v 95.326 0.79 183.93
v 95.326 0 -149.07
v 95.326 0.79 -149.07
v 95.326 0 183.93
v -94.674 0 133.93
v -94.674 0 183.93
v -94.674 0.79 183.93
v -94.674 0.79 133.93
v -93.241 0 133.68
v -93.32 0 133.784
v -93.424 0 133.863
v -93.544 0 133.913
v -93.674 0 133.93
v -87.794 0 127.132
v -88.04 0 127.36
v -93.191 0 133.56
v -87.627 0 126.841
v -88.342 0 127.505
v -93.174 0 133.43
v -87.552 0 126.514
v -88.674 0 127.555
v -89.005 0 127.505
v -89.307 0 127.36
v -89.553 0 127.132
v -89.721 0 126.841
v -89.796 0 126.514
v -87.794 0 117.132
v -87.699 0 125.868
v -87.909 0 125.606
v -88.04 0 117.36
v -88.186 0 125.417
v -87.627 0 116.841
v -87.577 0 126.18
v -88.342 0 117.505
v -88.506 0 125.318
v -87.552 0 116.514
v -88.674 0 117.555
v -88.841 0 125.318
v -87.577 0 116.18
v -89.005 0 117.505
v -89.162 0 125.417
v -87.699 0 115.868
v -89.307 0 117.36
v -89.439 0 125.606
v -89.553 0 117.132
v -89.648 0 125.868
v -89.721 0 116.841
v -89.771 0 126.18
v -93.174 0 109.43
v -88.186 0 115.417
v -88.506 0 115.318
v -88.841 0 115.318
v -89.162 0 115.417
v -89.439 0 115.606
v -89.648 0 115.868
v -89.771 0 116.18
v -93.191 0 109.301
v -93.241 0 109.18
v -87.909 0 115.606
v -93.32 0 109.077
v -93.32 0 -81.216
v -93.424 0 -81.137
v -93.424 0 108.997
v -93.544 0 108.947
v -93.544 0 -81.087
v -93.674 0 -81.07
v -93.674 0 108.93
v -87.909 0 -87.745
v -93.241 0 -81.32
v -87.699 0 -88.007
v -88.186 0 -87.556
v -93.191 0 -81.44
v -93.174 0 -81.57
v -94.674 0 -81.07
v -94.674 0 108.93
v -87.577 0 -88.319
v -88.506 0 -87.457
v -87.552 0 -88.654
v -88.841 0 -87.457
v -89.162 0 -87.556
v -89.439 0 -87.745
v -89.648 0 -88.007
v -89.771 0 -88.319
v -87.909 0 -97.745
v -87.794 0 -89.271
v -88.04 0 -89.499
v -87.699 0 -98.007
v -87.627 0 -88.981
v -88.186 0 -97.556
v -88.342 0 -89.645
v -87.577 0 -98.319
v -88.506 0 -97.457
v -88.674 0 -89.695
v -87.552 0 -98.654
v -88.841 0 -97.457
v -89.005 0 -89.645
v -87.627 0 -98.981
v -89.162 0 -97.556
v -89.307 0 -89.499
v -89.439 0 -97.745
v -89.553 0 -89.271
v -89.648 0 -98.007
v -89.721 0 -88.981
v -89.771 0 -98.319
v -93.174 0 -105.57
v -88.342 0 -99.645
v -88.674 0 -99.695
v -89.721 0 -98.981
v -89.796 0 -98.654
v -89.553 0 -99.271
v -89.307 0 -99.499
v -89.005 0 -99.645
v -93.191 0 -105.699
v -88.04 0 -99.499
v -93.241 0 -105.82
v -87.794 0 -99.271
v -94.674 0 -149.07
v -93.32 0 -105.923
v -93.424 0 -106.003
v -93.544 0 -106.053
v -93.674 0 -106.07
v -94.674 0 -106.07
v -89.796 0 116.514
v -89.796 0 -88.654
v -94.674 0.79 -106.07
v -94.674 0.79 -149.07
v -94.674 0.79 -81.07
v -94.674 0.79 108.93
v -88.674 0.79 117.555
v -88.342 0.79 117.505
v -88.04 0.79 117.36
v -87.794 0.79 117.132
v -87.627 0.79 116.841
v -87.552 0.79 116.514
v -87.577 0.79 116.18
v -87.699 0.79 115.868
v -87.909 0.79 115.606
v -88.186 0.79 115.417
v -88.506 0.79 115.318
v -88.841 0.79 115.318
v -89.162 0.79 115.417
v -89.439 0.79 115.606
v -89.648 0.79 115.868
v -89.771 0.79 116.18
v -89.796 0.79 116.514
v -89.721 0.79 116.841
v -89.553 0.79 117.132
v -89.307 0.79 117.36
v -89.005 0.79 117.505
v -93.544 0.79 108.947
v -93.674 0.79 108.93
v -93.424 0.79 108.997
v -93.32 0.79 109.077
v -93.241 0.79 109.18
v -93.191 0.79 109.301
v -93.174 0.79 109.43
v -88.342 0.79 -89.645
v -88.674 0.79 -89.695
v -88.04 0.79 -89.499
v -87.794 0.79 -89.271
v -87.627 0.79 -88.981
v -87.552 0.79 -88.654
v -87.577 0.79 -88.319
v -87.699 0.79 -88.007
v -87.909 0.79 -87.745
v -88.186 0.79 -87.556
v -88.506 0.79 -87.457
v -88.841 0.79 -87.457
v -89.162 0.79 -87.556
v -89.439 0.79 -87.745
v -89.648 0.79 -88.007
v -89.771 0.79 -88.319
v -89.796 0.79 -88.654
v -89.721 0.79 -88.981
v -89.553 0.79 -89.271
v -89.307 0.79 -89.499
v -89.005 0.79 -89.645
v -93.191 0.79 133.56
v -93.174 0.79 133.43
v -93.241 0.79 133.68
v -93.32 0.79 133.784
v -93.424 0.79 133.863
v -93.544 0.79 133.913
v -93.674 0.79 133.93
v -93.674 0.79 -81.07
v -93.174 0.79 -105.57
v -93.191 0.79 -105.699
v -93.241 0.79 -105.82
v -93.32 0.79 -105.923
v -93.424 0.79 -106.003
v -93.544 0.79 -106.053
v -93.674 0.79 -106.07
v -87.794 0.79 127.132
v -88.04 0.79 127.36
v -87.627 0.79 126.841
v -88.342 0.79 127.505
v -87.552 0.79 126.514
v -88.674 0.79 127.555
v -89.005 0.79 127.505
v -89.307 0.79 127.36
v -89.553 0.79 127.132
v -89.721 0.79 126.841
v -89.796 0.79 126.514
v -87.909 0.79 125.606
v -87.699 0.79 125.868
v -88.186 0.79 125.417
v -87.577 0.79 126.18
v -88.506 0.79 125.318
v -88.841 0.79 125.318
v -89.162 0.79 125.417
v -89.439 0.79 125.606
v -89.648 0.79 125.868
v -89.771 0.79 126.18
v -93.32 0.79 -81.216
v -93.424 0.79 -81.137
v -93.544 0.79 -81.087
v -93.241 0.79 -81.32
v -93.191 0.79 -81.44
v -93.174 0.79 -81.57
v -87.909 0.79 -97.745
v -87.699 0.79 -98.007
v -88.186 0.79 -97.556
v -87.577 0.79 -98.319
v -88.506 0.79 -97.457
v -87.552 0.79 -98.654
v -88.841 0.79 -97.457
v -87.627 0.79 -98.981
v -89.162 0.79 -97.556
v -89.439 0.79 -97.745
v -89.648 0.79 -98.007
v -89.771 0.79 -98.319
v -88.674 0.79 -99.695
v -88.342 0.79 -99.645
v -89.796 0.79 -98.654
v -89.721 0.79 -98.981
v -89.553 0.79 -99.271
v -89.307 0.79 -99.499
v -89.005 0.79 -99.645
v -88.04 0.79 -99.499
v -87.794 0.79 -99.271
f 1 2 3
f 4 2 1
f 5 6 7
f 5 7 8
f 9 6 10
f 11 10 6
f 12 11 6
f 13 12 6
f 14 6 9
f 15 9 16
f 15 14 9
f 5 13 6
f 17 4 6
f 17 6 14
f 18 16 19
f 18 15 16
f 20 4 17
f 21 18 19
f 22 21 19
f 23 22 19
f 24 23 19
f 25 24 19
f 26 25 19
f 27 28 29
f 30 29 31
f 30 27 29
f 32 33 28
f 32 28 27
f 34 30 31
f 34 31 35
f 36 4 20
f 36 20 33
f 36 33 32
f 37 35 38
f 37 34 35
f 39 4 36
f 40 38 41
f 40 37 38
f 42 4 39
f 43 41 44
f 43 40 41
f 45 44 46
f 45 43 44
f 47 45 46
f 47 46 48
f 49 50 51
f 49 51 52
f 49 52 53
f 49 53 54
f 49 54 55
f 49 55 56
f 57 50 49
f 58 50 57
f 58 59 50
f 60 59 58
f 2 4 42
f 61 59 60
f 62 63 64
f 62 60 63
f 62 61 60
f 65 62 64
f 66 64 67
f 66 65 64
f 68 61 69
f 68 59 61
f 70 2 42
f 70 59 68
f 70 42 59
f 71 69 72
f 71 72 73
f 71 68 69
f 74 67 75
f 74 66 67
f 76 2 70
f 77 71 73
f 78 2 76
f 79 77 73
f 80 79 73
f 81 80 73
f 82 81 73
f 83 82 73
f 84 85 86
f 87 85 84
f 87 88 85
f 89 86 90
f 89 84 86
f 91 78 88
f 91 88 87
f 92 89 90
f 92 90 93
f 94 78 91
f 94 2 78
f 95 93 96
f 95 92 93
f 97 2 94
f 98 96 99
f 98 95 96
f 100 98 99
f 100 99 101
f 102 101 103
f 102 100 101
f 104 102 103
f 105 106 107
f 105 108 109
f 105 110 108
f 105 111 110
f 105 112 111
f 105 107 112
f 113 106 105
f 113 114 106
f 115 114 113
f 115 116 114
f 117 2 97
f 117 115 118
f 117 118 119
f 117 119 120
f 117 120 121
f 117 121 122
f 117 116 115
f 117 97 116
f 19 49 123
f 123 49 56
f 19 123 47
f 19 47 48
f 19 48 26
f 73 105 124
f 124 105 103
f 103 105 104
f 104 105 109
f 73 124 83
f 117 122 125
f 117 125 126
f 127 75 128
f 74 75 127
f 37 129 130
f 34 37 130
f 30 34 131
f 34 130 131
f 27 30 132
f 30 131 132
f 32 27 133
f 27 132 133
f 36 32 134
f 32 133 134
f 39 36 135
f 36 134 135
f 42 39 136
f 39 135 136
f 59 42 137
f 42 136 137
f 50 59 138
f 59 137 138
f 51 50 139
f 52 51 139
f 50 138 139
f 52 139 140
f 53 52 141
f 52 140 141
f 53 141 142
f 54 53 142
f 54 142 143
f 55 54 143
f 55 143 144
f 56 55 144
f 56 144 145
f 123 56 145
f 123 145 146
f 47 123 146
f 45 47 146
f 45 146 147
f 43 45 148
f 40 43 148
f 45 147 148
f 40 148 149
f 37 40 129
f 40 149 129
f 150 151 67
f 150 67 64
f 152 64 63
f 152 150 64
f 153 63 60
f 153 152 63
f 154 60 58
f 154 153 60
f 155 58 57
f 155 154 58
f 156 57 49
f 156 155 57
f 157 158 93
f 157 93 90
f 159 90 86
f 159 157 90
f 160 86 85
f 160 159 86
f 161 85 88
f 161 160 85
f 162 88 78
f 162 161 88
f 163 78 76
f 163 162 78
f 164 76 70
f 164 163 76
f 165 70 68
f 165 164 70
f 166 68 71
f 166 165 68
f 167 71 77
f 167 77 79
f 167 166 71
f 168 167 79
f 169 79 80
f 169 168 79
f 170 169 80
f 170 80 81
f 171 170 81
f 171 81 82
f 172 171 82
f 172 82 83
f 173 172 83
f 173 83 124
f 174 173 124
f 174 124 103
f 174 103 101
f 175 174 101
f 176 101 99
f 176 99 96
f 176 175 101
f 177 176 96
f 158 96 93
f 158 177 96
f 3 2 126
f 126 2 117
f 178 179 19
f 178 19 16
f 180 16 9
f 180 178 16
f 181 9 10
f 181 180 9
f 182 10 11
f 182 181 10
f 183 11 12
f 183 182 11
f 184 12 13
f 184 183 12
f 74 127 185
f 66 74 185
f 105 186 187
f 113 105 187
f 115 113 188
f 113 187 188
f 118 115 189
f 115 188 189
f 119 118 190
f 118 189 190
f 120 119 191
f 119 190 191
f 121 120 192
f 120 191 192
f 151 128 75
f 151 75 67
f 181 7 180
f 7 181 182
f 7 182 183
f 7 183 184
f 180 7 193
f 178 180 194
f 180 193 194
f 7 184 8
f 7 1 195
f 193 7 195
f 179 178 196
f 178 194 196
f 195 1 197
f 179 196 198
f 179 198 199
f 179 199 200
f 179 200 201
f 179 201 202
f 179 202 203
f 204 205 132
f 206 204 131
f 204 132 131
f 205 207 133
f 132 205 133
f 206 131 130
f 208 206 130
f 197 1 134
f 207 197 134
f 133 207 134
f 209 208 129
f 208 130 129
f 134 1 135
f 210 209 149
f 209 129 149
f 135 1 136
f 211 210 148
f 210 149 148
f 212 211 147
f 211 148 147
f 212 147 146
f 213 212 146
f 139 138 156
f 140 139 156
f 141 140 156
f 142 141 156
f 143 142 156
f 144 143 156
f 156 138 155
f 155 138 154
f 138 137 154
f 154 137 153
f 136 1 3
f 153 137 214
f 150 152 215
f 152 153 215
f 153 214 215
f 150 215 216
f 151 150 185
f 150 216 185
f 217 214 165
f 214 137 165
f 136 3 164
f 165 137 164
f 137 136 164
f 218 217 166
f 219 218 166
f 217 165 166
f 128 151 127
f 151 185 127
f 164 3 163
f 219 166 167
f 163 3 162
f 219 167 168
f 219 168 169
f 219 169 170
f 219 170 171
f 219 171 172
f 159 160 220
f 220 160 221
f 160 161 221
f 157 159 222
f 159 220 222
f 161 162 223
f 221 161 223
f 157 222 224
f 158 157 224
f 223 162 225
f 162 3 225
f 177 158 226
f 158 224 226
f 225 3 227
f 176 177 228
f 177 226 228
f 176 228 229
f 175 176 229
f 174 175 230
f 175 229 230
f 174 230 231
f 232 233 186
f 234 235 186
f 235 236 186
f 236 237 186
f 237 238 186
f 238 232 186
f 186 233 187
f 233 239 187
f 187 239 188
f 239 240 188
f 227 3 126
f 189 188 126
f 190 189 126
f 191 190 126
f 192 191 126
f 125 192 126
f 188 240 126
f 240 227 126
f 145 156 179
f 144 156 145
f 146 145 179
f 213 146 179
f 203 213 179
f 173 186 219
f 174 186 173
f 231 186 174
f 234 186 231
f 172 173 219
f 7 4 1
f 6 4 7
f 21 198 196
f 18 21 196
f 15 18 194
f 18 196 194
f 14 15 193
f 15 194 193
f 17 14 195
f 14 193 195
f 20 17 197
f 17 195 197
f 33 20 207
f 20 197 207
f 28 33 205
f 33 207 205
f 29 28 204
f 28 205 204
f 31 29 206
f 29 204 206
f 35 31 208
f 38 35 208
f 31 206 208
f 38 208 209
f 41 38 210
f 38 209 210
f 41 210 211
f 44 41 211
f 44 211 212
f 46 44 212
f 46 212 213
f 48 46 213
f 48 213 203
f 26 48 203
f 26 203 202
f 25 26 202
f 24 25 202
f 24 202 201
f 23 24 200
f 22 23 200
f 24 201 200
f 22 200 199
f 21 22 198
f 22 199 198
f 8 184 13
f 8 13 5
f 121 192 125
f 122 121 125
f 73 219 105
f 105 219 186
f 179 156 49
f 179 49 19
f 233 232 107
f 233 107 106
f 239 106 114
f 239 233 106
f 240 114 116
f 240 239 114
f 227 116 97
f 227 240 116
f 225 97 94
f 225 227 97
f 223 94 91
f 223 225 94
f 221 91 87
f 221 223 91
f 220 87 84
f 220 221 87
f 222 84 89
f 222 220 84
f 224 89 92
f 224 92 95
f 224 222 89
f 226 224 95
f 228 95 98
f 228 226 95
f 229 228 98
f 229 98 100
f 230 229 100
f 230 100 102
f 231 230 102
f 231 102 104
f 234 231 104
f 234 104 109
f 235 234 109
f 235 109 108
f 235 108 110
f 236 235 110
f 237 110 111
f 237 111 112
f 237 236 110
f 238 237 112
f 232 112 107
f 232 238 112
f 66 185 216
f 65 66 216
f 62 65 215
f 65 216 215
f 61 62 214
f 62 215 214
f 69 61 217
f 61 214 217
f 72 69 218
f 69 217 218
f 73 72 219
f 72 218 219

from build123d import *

# Parameters (mm, degrees)
PANEL_DEPTH       = 0.79
SKETCH3_R         = 1.125
HINGE_MOUNT_DEPTH = 0.79


with BuildPart() as part:
    # Sketch1 → Panel (new body)
    with BuildSketch(Plane(origin=(0, 0, 0), x_dir=(1, 0, 0), z_dir=(0, 1, 0))):
        Polygon((65.326251897, 149.069802731), (95.326251897, 149.069802731), (95.326251897, -183.930197269), (-94.673748103, -183.930197269), (-94.673748103, 149.069802731), (-64.673748103, 149.069802731), (-39.673748103, 149.069802731), (40.326251897, 149.069802731), align=None)
    extrude(amount=PANEL_DEPTH)

    # Sketch3 → Hinge Mount (cut)
    with BuildSketch(Plane(origin=(0, 0.79, 0), x_dir=(1, 0, 0), z_dir=(0, 1, 0))):
        with Locations(Location((-88.673748103, -116.430197269, 0), (0, 0, 270))):
            Circle(SKETCH3_R)
        with Locations(Location((-88.673748103, -126.430197269, 0), (0, 0, 270))):
            Circle(SKETCH3_R)
        with BuildLine():
            Line((-94.673748103, -108.930197269), (-93.673748103, -108.930197269))
            ThreePointArc((-93.673748103, -108.930197269), (-93.320194713, -109.076643878), (-93.173748103, -109.430197269))
            Line((-93.173748103, -109.430197269), (-93.173748103, -133.430197269))
            ThreePointArc((-93.173748103, -133.430197269), (-93.320194713, -133.783750659), (-93.673748103, -133.930197269))
            Line((-93.673748103, -133.930197269), (-94.673748103, -133.930197269))
            Line((-94.673748103, -133.930197269), (-94.673748103, -108.930197269))
        make_face()
    hinge_mount = extrude(amount=-HINGE_MOUNT_DEPTH, mode=Mode.SUBTRACT)

    # Mirror1: Hinge Mount across plane
    add(hinge_mount.mirror(Plane.XY.offset(13.930197269)), mode=Mode.SUBTRACT)


solid = part.part
